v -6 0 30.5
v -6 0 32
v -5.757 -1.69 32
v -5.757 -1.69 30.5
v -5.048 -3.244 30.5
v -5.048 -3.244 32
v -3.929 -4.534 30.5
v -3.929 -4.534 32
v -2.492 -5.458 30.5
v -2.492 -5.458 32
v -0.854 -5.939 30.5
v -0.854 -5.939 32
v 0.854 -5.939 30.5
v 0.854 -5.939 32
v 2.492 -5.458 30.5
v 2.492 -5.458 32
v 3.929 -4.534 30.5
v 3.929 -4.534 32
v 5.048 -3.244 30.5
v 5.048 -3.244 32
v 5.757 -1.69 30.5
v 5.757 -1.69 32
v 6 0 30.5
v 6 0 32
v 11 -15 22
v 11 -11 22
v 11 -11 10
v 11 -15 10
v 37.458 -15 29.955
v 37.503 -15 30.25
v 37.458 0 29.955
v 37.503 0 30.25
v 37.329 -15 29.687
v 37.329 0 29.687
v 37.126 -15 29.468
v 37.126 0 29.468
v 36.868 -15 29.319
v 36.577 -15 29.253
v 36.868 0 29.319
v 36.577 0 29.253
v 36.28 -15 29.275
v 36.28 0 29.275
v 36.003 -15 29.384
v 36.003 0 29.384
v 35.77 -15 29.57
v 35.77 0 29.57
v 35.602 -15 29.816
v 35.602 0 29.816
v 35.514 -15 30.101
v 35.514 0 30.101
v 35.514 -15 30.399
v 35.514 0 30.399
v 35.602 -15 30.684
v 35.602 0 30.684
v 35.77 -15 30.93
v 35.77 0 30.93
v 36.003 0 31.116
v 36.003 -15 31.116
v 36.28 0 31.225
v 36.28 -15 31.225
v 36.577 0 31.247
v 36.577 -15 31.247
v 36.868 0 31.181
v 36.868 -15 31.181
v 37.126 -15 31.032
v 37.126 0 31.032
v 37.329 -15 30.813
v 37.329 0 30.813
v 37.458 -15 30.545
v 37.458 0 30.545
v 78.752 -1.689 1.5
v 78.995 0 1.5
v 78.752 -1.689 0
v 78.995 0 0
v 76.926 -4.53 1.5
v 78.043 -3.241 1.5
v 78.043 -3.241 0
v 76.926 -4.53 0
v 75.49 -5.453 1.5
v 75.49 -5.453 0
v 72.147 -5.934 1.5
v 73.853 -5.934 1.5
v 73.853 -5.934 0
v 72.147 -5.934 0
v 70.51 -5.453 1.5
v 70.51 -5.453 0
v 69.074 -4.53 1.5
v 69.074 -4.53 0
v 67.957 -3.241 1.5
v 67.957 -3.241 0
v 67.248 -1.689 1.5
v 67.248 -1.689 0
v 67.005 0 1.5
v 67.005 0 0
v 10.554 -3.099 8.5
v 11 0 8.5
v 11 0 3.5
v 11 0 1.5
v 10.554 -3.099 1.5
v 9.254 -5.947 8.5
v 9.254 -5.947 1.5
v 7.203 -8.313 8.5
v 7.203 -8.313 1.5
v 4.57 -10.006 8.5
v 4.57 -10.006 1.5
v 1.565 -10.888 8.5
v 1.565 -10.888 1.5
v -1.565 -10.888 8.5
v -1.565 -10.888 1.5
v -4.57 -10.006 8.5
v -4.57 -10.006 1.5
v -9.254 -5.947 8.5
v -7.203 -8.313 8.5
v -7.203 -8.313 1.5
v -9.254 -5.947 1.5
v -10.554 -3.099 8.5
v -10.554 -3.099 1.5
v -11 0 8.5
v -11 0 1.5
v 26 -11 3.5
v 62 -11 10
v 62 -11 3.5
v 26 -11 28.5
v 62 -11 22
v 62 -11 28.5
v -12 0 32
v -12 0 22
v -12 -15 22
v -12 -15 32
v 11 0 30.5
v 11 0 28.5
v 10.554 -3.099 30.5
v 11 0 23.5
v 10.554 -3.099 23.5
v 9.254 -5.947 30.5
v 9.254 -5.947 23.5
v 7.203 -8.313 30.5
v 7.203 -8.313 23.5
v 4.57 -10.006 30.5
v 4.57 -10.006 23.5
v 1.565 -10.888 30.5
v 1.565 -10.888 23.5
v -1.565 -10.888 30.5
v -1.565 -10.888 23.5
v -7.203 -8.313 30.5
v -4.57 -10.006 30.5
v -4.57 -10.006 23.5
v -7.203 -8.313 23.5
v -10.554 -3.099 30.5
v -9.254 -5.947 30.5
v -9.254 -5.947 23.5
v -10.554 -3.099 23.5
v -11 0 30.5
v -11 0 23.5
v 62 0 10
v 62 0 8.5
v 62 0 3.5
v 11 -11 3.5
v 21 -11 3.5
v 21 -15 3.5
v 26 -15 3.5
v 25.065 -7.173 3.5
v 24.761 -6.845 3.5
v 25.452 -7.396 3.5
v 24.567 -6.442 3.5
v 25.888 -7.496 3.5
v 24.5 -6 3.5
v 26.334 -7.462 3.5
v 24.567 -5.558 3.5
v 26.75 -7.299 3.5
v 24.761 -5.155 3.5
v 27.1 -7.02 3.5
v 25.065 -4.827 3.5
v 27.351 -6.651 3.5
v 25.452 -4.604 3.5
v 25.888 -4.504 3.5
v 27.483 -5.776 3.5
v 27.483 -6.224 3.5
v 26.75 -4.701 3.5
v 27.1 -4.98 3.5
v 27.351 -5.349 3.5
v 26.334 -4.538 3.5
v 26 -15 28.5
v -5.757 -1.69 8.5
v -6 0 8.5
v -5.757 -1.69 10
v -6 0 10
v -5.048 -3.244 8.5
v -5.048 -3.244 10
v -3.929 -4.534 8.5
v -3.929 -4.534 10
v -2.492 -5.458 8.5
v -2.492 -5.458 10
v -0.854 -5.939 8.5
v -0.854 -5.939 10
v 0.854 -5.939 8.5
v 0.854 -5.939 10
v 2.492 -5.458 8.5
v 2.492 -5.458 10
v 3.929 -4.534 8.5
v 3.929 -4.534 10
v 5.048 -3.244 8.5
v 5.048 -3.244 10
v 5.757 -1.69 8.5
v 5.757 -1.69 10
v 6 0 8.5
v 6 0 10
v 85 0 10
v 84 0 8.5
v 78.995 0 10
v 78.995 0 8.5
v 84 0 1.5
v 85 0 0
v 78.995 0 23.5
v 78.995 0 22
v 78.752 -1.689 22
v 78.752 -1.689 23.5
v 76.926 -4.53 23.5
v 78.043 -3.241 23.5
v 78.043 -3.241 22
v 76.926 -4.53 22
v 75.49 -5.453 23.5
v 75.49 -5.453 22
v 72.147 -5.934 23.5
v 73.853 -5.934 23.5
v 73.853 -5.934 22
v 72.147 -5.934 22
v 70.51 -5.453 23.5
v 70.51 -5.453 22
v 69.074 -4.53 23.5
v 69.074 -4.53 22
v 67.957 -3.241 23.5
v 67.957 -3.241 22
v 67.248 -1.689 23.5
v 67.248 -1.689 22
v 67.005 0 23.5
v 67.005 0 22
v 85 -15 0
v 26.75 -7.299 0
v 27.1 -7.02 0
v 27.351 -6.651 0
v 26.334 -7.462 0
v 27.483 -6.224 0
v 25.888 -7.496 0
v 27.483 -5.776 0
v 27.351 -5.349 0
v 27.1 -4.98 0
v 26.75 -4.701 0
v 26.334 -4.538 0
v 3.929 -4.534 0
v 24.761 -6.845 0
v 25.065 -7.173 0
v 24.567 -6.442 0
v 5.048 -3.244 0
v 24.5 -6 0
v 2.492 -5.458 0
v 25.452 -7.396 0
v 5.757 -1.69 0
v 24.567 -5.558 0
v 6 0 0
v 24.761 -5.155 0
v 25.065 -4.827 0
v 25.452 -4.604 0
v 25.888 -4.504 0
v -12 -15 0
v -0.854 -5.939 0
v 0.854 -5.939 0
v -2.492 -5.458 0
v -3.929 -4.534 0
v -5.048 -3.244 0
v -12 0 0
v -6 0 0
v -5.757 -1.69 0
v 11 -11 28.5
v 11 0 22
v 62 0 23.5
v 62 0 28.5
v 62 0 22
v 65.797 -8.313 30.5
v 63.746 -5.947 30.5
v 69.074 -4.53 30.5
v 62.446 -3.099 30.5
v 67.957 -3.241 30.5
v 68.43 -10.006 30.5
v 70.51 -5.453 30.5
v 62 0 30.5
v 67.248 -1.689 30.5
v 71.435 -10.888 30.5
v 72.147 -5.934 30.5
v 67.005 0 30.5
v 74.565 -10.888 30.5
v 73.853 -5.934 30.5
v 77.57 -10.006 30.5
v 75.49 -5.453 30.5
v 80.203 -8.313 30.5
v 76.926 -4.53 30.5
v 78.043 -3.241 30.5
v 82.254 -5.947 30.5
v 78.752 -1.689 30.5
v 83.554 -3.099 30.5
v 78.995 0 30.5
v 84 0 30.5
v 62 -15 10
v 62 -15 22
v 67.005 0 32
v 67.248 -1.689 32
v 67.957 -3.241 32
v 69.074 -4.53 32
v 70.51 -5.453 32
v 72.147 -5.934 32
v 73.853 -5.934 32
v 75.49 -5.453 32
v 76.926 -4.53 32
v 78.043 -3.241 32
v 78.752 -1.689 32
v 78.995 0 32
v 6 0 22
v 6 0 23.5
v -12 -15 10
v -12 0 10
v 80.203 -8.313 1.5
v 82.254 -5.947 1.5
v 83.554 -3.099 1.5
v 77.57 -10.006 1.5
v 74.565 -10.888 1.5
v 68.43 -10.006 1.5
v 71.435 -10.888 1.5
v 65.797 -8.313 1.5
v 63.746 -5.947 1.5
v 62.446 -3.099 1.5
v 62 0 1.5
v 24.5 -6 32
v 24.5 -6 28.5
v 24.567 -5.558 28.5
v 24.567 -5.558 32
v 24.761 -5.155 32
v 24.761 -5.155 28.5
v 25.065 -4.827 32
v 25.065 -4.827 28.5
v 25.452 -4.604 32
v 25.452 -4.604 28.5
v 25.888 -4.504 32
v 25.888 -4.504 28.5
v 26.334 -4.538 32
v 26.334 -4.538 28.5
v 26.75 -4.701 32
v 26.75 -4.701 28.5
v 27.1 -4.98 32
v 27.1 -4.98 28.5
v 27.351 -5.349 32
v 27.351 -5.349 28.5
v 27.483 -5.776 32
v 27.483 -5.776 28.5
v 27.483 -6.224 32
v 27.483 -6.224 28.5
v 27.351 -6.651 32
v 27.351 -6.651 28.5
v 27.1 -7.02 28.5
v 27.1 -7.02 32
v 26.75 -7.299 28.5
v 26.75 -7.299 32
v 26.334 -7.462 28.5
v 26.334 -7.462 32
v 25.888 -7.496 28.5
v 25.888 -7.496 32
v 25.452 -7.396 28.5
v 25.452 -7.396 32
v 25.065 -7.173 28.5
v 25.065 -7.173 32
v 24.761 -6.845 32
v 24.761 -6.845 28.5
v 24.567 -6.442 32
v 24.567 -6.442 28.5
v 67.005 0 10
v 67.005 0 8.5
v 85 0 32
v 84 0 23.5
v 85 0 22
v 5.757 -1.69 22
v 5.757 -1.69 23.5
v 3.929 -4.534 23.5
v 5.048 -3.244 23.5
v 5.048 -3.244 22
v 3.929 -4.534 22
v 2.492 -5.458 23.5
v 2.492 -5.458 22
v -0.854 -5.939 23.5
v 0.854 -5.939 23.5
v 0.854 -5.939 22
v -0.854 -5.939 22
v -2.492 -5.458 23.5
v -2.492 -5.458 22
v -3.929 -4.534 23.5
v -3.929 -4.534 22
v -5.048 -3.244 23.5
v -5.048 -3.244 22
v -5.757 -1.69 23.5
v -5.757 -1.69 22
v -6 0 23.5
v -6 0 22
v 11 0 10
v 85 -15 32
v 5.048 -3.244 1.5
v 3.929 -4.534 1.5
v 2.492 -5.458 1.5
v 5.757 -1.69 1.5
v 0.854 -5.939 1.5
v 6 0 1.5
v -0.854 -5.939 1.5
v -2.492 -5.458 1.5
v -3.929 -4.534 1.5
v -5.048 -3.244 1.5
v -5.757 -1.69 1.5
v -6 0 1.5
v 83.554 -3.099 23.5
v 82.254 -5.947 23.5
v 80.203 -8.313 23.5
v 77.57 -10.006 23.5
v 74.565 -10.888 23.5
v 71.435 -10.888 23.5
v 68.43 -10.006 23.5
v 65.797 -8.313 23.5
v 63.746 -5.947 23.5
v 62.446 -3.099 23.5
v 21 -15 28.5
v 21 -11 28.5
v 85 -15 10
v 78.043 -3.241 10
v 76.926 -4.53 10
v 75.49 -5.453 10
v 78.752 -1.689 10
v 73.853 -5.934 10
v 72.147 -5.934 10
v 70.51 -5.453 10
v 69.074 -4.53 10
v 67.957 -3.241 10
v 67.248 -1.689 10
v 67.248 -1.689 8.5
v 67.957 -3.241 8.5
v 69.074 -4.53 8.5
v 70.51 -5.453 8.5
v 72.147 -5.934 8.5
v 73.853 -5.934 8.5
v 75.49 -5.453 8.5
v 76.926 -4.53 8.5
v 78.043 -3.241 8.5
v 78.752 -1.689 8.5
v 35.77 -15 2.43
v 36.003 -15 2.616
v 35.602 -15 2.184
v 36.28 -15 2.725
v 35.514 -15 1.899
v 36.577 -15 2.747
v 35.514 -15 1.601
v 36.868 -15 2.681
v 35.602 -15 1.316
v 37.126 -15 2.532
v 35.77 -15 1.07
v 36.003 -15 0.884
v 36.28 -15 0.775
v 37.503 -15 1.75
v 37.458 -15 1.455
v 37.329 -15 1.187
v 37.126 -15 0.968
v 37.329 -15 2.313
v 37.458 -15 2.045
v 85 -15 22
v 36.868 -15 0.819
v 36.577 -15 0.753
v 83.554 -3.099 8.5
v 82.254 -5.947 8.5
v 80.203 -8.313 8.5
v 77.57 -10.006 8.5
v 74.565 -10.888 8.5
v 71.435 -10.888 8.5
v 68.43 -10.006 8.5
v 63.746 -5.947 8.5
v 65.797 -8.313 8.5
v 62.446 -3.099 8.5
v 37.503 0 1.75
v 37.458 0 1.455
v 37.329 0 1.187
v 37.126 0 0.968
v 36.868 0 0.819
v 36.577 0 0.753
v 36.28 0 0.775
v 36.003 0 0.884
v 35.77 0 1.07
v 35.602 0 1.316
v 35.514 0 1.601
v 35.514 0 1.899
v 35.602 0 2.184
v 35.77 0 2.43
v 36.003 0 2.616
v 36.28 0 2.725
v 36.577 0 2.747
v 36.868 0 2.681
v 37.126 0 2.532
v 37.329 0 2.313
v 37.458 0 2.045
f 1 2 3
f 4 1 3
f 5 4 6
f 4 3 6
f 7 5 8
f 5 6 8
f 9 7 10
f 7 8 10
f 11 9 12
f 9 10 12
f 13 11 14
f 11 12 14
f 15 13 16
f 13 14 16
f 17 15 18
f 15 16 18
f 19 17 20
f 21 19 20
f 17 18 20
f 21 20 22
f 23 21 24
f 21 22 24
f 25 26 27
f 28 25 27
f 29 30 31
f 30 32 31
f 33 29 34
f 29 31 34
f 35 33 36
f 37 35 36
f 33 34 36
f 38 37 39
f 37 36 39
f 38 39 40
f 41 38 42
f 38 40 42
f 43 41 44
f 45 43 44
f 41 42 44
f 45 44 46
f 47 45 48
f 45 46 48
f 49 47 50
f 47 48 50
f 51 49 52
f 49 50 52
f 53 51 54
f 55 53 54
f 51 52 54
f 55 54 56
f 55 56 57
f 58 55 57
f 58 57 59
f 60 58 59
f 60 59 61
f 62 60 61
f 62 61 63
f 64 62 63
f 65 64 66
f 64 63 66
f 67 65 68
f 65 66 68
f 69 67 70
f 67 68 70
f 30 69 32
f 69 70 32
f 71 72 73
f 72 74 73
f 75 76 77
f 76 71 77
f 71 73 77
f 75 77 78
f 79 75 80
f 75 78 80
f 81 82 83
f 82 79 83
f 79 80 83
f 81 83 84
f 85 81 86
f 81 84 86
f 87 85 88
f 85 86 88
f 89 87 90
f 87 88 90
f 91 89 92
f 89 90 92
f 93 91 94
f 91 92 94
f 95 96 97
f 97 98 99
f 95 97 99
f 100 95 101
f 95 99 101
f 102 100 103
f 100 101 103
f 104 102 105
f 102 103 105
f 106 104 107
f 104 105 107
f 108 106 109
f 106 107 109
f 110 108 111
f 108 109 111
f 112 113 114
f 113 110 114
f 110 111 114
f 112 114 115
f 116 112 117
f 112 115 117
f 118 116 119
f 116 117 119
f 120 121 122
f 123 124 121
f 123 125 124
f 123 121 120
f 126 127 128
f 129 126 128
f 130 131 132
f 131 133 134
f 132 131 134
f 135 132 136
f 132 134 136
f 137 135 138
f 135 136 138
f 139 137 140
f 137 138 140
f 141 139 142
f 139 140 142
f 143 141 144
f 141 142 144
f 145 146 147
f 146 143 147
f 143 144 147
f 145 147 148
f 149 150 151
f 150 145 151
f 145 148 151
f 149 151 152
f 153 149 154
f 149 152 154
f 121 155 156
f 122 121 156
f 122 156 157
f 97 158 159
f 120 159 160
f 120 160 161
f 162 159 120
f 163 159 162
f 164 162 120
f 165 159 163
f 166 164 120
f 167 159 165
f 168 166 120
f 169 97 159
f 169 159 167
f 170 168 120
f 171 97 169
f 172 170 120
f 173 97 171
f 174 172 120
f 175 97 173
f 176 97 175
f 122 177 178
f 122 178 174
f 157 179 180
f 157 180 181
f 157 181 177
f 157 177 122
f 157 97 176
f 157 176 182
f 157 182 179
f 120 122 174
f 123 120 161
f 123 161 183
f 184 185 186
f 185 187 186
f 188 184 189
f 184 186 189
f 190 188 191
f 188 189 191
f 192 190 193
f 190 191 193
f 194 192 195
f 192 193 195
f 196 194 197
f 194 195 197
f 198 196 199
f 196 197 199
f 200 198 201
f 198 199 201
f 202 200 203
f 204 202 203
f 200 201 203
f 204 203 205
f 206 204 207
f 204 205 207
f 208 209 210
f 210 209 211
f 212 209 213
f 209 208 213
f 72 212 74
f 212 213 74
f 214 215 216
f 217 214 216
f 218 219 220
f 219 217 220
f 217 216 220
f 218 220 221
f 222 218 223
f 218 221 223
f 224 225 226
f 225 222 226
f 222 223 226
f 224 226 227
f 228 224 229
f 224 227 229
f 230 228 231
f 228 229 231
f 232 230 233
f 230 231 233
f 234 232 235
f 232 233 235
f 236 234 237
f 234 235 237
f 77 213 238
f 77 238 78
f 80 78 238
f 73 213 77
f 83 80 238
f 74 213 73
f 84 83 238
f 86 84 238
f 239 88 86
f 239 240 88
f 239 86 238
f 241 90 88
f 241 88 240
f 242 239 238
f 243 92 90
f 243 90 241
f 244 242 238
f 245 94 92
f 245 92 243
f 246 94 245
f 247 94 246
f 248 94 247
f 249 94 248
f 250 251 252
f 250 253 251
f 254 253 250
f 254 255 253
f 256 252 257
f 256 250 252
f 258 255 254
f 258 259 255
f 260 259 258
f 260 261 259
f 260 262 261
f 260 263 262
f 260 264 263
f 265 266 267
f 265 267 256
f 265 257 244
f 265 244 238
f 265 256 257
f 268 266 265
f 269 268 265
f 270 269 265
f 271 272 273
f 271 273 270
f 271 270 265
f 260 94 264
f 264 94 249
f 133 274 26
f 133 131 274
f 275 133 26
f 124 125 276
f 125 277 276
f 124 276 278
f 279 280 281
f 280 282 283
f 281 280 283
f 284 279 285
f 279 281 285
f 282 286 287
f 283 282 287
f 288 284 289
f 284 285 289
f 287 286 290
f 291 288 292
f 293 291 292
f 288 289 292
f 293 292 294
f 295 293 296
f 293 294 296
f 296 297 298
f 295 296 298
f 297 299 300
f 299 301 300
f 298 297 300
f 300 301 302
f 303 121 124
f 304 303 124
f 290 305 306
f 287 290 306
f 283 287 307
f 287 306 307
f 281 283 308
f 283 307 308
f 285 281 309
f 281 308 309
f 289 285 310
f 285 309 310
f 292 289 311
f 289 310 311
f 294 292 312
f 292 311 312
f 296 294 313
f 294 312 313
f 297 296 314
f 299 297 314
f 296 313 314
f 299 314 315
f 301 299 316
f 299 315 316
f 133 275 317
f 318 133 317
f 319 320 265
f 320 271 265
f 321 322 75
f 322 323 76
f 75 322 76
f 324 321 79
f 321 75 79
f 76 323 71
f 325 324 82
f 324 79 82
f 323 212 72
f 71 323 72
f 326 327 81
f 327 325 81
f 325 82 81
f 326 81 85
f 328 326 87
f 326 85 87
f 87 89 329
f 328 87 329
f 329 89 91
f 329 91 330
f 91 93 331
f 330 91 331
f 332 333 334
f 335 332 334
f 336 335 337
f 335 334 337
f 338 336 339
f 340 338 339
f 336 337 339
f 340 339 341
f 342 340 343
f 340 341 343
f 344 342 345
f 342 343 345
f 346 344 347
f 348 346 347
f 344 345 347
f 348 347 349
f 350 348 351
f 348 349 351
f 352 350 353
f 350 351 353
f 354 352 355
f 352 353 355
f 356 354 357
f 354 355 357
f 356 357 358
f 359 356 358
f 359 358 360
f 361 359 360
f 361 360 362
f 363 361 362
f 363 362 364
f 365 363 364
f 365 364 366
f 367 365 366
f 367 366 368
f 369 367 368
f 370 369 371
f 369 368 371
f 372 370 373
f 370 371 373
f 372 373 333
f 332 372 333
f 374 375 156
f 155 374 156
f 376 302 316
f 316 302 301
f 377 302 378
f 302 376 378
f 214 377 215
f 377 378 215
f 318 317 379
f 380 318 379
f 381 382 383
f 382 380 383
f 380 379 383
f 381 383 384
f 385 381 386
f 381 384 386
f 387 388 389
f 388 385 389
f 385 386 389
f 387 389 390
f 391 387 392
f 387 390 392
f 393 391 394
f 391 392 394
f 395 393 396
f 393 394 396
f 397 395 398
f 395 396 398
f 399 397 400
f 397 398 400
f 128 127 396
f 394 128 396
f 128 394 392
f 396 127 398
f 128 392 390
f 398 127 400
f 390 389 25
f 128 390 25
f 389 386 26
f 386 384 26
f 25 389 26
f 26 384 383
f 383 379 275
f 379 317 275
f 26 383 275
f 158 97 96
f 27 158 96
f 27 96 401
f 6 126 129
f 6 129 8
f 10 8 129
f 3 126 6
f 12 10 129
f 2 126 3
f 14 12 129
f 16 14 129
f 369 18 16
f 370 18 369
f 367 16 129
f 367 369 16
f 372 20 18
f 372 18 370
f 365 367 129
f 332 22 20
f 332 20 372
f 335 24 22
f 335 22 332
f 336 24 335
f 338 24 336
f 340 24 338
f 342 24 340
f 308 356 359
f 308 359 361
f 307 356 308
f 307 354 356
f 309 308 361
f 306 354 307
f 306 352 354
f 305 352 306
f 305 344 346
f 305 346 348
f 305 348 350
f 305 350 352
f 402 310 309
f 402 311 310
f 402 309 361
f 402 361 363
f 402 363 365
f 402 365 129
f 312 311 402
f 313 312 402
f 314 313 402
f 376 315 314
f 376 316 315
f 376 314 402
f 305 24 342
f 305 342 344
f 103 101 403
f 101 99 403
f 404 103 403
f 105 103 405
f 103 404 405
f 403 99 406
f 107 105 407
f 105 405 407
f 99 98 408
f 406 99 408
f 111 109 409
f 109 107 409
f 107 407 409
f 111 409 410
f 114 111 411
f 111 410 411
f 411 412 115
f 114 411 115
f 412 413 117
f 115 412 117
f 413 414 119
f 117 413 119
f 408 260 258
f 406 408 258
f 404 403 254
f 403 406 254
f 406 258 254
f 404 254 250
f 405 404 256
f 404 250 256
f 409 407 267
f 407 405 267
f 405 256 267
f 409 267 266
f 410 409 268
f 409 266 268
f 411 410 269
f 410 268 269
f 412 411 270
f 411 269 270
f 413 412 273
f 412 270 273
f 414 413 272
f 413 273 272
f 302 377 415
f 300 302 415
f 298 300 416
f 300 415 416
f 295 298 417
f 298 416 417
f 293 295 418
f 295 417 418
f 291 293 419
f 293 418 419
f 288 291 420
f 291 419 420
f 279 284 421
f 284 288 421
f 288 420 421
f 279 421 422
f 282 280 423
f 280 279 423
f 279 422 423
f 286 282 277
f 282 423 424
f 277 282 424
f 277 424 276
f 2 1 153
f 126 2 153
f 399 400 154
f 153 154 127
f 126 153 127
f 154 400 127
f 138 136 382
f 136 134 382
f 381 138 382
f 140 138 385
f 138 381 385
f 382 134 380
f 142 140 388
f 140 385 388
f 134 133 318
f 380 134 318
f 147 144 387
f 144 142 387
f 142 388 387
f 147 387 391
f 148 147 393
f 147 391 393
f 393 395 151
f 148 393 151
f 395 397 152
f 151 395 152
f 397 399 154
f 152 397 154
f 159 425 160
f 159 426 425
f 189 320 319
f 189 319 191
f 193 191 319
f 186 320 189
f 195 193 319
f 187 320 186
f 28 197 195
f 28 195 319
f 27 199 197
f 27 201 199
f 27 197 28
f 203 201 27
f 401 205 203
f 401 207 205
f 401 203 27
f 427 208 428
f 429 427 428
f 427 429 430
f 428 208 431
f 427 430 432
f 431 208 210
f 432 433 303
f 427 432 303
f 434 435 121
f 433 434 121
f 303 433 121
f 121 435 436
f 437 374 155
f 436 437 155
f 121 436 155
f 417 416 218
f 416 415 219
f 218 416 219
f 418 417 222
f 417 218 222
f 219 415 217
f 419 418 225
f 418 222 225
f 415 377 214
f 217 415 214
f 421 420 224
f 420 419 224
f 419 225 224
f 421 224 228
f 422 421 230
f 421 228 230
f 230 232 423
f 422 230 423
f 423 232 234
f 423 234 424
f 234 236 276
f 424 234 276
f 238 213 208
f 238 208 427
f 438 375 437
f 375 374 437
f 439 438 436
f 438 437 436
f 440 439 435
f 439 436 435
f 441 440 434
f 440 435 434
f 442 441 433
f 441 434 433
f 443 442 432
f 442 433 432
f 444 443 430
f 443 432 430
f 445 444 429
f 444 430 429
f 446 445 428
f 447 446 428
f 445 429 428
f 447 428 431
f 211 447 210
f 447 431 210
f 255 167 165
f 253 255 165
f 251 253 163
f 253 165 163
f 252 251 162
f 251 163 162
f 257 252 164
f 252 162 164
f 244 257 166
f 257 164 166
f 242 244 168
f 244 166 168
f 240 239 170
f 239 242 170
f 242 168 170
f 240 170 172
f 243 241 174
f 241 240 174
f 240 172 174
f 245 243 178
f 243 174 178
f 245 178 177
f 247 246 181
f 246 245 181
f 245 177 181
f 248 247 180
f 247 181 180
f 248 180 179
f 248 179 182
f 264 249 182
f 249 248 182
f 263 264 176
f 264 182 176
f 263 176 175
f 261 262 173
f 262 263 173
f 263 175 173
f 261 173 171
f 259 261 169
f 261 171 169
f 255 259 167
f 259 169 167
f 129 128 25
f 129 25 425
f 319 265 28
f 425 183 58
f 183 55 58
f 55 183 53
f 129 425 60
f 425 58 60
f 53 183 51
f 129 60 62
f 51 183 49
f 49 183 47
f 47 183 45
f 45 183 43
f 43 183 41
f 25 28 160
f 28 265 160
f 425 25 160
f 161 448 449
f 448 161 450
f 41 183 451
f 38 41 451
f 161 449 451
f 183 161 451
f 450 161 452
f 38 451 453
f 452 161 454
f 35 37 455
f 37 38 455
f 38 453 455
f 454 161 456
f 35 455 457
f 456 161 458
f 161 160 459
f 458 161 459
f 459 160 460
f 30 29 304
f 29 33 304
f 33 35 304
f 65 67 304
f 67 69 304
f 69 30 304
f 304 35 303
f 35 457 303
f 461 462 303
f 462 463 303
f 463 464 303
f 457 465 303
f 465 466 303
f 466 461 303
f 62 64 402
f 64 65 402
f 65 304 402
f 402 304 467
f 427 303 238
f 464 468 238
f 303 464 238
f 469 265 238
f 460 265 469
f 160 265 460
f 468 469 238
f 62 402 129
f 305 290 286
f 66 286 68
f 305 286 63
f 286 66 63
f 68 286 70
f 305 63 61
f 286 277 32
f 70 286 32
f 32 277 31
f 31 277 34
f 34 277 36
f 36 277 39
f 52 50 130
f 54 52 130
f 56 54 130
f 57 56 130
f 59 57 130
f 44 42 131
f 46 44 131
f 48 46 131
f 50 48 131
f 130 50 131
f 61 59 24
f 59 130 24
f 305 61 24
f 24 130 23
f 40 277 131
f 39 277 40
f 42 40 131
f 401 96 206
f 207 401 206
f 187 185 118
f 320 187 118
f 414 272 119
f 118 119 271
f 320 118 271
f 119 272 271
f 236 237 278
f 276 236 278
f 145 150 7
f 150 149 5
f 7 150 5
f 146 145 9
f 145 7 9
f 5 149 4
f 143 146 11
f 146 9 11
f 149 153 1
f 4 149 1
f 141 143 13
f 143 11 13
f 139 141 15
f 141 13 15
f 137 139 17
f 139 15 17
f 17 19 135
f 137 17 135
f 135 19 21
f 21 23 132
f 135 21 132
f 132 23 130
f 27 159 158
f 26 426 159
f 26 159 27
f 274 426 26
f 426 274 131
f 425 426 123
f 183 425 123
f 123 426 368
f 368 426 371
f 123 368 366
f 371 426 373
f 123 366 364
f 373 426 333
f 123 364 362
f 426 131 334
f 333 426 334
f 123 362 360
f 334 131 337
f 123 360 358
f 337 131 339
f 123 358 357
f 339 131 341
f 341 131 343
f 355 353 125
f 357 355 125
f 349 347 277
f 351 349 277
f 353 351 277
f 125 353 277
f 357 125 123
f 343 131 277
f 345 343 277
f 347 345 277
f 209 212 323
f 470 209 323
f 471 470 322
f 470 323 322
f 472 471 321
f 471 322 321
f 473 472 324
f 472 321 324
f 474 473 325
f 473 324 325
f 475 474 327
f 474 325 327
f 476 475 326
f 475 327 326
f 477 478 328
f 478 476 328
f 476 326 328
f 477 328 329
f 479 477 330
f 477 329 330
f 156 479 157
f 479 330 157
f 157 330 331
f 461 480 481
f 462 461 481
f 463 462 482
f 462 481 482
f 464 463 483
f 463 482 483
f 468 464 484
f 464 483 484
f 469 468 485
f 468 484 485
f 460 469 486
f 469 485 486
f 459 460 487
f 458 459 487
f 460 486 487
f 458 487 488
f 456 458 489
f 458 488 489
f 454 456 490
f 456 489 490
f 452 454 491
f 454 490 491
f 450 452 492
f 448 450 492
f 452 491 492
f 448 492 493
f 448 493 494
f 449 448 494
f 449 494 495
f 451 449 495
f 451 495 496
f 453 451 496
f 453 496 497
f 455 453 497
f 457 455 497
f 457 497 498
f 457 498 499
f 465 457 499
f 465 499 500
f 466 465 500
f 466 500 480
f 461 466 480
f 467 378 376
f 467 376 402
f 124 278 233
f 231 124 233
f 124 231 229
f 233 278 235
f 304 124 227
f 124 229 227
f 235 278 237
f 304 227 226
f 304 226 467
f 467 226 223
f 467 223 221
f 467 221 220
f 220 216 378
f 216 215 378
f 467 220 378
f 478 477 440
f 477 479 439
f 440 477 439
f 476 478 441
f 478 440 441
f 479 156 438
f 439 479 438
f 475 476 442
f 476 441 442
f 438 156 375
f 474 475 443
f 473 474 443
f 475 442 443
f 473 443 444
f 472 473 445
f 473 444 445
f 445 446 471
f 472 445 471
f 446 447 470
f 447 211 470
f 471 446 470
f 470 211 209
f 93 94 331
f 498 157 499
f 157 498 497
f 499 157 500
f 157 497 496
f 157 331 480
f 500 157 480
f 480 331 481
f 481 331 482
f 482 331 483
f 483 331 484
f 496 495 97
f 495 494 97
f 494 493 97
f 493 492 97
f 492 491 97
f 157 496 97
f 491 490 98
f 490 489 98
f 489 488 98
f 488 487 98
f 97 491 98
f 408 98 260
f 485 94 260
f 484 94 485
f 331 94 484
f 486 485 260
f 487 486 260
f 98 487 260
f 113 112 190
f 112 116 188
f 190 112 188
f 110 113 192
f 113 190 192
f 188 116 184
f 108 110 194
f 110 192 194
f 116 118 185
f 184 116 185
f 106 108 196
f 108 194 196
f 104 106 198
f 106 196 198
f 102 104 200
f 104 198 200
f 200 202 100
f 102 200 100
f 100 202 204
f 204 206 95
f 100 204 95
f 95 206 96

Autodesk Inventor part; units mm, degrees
sketch "Эскиз1" plane through (0, 0, 0) normal (0, 0, 1) x (1, 0, 0)
  circle A0 centre (0, 0) radius 4
  circle A1 centre (0, 0) radius 11
  line L0 (-11, 0) -> (-12, 0)
  line L1 (-12, 0) -> (-12, -15)
  circle A2 centre (73, 0) radius 4
  circle A3 centre (73, 0) radius 11
  line L2 (84, 0) -> (85, 0)
  line L3 (85, 0) -> (85, -15)
  line L4 (-12, -15) -> (85, -15)
  line L5 (11, 0) -> (62, 0)
  dimension "d0" = 8
  dimension "d1" = 22
  dimension "d2" = 1
  dimension "d6" = 15
  dimension "d92" = 73
  dimension "d93" = 51
extrude "Выдавливание1" add sketch "Эскиз1" along normal blind 32 contours L5 A3 L2 L3 L4 L1 L0 A1
sketch "Эскиз2" plane through (0, 0, 32) normal (0, 0, 1) x (1, 0, 0)
  arc A0 (-11, 0) -> (11, 0) centre (0, 0) ccw
  line L0 (62, 0) -> (11, 0) projected
  arc A1 (-11, 0) -> (11, 0) centre (0, 0) ccw projected
  line L1 (11, 0) -> (11, 0)
  arc A2 (-6, 0) -> (6, 0) centre (0, 0) ccw
  line L2 (-11, 0) -> (-6, 0)
  line L3 (6, 0) -> (11, 0)
  dimension "d14" = 12
extrude "Выдавливание2" add sketch "Эскиз2" against normal blind 1.5
sketch "Эскиз3" plane through (0, 0, 32) normal (0, 0, 1) x (1, 0, 0)
  arc A0 (62, 0) -> (84, 0) centre (73, 0) ccw projected
  line L0 (85, 0) -> (84, 0) projected
  line L1 (84, 0) -> (84, 0)
  arc A1 (62, 0) -> (84, 0) centre (73, 0) ccw
  arc A2 (67.0053, 0) -> (78.9947, 0) centre (73, 0) ccw
  line L2 (62, 0) -> (11, 0) projected
  line L3 (62, 0) -> (67.0053, 0)
  line L4 (78.9947, 0) -> (84, 0)
  point P0 (0, 0)
extrude "Выдавливание3" add sketch "Эскиз3" against normal blind 1.5
ref_plane "РабПлоскость5" through (0, 0, 16) normal (0, 0, -1) x (-1, 0, 0)
mirror "Зеркальное отражение7" about plane through (0, 0, 16) normal (0, 0, -1) of "Выдавливание3"
mirror "Зеркальное отражение8" about plane through (0, 0, 16) normal (0, 0, -1) of "Выдавливание2"
ref_plane "РабПлоскость10" through (0, 0, 27) normal (0, 0, 1) x (1, 0, 0)
mirror "Зеркальное отражение9" about plane through (0, 0, 27) normal (0, 0, 1) of "Выдавливание2"
mirror "Зеркальное отражение10" about plane through (0, 0, 27) normal (0, 0, 1) of "Выдавливание3"
ref_plane "РабПлоскость11" through (0, 0, 5) normal (0, 0, -1) x (-1, 0, 0)
mirror "Зеркальное отражение11" about plane through (0, 0, 5) normal (0, 0, -1) of "Зеркальное отражение8"
mirror "Зеркальное отражение12" about plane through (0, 0, 5) normal (0, 0, -1) of "Зеркальное отражение7"
sketch "Эскиз14" plane through (6, 0, 30.5) normal (0, 1, 0) x (1, 0, 0)
  line L0 (5, 20.5) -> (5, 8.5) projected
  line L1 (5, 14.5) -> (56, 14.5)
  line L2 (56, 20.5) -> (56, 8.5) projected
  line L3 (56, 14.5) -> (56, 27)
  line L4 (56, 29) -> (56, 22) projected
  line L5 (5, 14.5) -> (5, 27)
  line L6 (5, 29) -> (5, 22) projected
  line L7 (5, 27) -> (56, 27)
  dimension "d94" = 12.5
extrude "Выдавливание11" cut sketch "Эскиз14" against normal blind 11
ref_plane "РабПлоскость14" through (36.5, -15, 0) normal (-1, 0, 0) x (0, 0, 1)
sketch "Эскиз15" plane through (85, 0, 32) normal (0, 1, 0) x (1, 0, 0)
  line L0 (-23, 16) -> (-23, 10) projected
  line L1 (-23, 10) -> (9, 10)
  line L2 (9, 10) -> (9, 22)
  line L3 (9, 22) -> (-23, 22)
  line L4 (-23, 22) -> (-23, 10)
  point P0 (-85, 32)
  dimension "d95" = 12
  dimension "d96" = 32
extrude "Выдавливание12" cut sketch "Эскиз15" against normal up to next
mirror "Зеркальное отражение15" about plane through (36.5, -15, 0) normal (-1, 0, 0) of "Выдавливание12"
sketch "Эскиз16" plane through (6, 0, 30.5) normal (0, 1, 0) x (1, 0, 0)
  line L0 (79, 8.5) -> (79, -1.5) projected
  line L1 (-18, 30.5) -> (-18, -1.5) projected
  line L2 (61.0053, -1.5) -> (0, -1.5) projected
  line L3 (30.5026, -1.5) -> (30.5026, 0.25)
  circle A0 centre (30.5026, 0.25) radius 1
  point P0 (-6, 30.5)
  point P1 (-18, 8.5)
  dimension "d86" = 1.75
  dimension "d87" = 2
extrude "Выдавливание13" cut sketch "Эскиз16" against normal up to next
mirror "Зеркальное отражение16" about plane through (0, 0, 16) normal (0, 0, -1) of "Выдавливание13"
mirror "Зеркальное отражение17" about plane through (0, 0, 16) normal (0, 0, -1) of "Выдавливание11"
sketch "Эскиз19" plane through (62, 0, 28.5) normal (0, 0, -1) x (-1, 0, 0)
  circle A0 centre (36, -6) radius 1.5
  line L0 (51, -11) -> (0, -11) projected
  line L1 (51, 0) -> (51, -11) projected
  point P0 (62, 0)
  dimension "d103" = 3
  dimension "d104" = 5
  dimension "d105" = 15
extrude "Выдавливание15" cut sketch "Эскиз19" against normal up to next
mirror "Зеркальное отражение18" about plane through (0, 0, 16) normal (0, 0, -1) of "Выдавливание15"
sketch "Эскиз20" plane through (6, -11, 30.5) normal (0, 1, 0) x (1, 0, 0)
  line L0 (5, 27) -> (56, 27) projected
  line L1 (5, 2) -> (56, 2) projected
  line L2 (5, 8.5) -> (5, 20.5) projected
  line L3 (5, 27) -> (56, 27) projected
  line L4 (56, 2) -> (5, 2) projected
  line L5 (15, 27) -> (20, 27)
  line L6 (20, 27) -> (20, 2)
  line L7 (20, 2) -> (15, 2)
  line L8 (15, 2) -> (15, 27)
  point P0 (-6, 30.5)
  dimension "d119" = 5
  dimension "d120" = 15
extrude "Выдавливание17" cut sketch "Эскиз20" against normal up to next
properties part number "Водило"
